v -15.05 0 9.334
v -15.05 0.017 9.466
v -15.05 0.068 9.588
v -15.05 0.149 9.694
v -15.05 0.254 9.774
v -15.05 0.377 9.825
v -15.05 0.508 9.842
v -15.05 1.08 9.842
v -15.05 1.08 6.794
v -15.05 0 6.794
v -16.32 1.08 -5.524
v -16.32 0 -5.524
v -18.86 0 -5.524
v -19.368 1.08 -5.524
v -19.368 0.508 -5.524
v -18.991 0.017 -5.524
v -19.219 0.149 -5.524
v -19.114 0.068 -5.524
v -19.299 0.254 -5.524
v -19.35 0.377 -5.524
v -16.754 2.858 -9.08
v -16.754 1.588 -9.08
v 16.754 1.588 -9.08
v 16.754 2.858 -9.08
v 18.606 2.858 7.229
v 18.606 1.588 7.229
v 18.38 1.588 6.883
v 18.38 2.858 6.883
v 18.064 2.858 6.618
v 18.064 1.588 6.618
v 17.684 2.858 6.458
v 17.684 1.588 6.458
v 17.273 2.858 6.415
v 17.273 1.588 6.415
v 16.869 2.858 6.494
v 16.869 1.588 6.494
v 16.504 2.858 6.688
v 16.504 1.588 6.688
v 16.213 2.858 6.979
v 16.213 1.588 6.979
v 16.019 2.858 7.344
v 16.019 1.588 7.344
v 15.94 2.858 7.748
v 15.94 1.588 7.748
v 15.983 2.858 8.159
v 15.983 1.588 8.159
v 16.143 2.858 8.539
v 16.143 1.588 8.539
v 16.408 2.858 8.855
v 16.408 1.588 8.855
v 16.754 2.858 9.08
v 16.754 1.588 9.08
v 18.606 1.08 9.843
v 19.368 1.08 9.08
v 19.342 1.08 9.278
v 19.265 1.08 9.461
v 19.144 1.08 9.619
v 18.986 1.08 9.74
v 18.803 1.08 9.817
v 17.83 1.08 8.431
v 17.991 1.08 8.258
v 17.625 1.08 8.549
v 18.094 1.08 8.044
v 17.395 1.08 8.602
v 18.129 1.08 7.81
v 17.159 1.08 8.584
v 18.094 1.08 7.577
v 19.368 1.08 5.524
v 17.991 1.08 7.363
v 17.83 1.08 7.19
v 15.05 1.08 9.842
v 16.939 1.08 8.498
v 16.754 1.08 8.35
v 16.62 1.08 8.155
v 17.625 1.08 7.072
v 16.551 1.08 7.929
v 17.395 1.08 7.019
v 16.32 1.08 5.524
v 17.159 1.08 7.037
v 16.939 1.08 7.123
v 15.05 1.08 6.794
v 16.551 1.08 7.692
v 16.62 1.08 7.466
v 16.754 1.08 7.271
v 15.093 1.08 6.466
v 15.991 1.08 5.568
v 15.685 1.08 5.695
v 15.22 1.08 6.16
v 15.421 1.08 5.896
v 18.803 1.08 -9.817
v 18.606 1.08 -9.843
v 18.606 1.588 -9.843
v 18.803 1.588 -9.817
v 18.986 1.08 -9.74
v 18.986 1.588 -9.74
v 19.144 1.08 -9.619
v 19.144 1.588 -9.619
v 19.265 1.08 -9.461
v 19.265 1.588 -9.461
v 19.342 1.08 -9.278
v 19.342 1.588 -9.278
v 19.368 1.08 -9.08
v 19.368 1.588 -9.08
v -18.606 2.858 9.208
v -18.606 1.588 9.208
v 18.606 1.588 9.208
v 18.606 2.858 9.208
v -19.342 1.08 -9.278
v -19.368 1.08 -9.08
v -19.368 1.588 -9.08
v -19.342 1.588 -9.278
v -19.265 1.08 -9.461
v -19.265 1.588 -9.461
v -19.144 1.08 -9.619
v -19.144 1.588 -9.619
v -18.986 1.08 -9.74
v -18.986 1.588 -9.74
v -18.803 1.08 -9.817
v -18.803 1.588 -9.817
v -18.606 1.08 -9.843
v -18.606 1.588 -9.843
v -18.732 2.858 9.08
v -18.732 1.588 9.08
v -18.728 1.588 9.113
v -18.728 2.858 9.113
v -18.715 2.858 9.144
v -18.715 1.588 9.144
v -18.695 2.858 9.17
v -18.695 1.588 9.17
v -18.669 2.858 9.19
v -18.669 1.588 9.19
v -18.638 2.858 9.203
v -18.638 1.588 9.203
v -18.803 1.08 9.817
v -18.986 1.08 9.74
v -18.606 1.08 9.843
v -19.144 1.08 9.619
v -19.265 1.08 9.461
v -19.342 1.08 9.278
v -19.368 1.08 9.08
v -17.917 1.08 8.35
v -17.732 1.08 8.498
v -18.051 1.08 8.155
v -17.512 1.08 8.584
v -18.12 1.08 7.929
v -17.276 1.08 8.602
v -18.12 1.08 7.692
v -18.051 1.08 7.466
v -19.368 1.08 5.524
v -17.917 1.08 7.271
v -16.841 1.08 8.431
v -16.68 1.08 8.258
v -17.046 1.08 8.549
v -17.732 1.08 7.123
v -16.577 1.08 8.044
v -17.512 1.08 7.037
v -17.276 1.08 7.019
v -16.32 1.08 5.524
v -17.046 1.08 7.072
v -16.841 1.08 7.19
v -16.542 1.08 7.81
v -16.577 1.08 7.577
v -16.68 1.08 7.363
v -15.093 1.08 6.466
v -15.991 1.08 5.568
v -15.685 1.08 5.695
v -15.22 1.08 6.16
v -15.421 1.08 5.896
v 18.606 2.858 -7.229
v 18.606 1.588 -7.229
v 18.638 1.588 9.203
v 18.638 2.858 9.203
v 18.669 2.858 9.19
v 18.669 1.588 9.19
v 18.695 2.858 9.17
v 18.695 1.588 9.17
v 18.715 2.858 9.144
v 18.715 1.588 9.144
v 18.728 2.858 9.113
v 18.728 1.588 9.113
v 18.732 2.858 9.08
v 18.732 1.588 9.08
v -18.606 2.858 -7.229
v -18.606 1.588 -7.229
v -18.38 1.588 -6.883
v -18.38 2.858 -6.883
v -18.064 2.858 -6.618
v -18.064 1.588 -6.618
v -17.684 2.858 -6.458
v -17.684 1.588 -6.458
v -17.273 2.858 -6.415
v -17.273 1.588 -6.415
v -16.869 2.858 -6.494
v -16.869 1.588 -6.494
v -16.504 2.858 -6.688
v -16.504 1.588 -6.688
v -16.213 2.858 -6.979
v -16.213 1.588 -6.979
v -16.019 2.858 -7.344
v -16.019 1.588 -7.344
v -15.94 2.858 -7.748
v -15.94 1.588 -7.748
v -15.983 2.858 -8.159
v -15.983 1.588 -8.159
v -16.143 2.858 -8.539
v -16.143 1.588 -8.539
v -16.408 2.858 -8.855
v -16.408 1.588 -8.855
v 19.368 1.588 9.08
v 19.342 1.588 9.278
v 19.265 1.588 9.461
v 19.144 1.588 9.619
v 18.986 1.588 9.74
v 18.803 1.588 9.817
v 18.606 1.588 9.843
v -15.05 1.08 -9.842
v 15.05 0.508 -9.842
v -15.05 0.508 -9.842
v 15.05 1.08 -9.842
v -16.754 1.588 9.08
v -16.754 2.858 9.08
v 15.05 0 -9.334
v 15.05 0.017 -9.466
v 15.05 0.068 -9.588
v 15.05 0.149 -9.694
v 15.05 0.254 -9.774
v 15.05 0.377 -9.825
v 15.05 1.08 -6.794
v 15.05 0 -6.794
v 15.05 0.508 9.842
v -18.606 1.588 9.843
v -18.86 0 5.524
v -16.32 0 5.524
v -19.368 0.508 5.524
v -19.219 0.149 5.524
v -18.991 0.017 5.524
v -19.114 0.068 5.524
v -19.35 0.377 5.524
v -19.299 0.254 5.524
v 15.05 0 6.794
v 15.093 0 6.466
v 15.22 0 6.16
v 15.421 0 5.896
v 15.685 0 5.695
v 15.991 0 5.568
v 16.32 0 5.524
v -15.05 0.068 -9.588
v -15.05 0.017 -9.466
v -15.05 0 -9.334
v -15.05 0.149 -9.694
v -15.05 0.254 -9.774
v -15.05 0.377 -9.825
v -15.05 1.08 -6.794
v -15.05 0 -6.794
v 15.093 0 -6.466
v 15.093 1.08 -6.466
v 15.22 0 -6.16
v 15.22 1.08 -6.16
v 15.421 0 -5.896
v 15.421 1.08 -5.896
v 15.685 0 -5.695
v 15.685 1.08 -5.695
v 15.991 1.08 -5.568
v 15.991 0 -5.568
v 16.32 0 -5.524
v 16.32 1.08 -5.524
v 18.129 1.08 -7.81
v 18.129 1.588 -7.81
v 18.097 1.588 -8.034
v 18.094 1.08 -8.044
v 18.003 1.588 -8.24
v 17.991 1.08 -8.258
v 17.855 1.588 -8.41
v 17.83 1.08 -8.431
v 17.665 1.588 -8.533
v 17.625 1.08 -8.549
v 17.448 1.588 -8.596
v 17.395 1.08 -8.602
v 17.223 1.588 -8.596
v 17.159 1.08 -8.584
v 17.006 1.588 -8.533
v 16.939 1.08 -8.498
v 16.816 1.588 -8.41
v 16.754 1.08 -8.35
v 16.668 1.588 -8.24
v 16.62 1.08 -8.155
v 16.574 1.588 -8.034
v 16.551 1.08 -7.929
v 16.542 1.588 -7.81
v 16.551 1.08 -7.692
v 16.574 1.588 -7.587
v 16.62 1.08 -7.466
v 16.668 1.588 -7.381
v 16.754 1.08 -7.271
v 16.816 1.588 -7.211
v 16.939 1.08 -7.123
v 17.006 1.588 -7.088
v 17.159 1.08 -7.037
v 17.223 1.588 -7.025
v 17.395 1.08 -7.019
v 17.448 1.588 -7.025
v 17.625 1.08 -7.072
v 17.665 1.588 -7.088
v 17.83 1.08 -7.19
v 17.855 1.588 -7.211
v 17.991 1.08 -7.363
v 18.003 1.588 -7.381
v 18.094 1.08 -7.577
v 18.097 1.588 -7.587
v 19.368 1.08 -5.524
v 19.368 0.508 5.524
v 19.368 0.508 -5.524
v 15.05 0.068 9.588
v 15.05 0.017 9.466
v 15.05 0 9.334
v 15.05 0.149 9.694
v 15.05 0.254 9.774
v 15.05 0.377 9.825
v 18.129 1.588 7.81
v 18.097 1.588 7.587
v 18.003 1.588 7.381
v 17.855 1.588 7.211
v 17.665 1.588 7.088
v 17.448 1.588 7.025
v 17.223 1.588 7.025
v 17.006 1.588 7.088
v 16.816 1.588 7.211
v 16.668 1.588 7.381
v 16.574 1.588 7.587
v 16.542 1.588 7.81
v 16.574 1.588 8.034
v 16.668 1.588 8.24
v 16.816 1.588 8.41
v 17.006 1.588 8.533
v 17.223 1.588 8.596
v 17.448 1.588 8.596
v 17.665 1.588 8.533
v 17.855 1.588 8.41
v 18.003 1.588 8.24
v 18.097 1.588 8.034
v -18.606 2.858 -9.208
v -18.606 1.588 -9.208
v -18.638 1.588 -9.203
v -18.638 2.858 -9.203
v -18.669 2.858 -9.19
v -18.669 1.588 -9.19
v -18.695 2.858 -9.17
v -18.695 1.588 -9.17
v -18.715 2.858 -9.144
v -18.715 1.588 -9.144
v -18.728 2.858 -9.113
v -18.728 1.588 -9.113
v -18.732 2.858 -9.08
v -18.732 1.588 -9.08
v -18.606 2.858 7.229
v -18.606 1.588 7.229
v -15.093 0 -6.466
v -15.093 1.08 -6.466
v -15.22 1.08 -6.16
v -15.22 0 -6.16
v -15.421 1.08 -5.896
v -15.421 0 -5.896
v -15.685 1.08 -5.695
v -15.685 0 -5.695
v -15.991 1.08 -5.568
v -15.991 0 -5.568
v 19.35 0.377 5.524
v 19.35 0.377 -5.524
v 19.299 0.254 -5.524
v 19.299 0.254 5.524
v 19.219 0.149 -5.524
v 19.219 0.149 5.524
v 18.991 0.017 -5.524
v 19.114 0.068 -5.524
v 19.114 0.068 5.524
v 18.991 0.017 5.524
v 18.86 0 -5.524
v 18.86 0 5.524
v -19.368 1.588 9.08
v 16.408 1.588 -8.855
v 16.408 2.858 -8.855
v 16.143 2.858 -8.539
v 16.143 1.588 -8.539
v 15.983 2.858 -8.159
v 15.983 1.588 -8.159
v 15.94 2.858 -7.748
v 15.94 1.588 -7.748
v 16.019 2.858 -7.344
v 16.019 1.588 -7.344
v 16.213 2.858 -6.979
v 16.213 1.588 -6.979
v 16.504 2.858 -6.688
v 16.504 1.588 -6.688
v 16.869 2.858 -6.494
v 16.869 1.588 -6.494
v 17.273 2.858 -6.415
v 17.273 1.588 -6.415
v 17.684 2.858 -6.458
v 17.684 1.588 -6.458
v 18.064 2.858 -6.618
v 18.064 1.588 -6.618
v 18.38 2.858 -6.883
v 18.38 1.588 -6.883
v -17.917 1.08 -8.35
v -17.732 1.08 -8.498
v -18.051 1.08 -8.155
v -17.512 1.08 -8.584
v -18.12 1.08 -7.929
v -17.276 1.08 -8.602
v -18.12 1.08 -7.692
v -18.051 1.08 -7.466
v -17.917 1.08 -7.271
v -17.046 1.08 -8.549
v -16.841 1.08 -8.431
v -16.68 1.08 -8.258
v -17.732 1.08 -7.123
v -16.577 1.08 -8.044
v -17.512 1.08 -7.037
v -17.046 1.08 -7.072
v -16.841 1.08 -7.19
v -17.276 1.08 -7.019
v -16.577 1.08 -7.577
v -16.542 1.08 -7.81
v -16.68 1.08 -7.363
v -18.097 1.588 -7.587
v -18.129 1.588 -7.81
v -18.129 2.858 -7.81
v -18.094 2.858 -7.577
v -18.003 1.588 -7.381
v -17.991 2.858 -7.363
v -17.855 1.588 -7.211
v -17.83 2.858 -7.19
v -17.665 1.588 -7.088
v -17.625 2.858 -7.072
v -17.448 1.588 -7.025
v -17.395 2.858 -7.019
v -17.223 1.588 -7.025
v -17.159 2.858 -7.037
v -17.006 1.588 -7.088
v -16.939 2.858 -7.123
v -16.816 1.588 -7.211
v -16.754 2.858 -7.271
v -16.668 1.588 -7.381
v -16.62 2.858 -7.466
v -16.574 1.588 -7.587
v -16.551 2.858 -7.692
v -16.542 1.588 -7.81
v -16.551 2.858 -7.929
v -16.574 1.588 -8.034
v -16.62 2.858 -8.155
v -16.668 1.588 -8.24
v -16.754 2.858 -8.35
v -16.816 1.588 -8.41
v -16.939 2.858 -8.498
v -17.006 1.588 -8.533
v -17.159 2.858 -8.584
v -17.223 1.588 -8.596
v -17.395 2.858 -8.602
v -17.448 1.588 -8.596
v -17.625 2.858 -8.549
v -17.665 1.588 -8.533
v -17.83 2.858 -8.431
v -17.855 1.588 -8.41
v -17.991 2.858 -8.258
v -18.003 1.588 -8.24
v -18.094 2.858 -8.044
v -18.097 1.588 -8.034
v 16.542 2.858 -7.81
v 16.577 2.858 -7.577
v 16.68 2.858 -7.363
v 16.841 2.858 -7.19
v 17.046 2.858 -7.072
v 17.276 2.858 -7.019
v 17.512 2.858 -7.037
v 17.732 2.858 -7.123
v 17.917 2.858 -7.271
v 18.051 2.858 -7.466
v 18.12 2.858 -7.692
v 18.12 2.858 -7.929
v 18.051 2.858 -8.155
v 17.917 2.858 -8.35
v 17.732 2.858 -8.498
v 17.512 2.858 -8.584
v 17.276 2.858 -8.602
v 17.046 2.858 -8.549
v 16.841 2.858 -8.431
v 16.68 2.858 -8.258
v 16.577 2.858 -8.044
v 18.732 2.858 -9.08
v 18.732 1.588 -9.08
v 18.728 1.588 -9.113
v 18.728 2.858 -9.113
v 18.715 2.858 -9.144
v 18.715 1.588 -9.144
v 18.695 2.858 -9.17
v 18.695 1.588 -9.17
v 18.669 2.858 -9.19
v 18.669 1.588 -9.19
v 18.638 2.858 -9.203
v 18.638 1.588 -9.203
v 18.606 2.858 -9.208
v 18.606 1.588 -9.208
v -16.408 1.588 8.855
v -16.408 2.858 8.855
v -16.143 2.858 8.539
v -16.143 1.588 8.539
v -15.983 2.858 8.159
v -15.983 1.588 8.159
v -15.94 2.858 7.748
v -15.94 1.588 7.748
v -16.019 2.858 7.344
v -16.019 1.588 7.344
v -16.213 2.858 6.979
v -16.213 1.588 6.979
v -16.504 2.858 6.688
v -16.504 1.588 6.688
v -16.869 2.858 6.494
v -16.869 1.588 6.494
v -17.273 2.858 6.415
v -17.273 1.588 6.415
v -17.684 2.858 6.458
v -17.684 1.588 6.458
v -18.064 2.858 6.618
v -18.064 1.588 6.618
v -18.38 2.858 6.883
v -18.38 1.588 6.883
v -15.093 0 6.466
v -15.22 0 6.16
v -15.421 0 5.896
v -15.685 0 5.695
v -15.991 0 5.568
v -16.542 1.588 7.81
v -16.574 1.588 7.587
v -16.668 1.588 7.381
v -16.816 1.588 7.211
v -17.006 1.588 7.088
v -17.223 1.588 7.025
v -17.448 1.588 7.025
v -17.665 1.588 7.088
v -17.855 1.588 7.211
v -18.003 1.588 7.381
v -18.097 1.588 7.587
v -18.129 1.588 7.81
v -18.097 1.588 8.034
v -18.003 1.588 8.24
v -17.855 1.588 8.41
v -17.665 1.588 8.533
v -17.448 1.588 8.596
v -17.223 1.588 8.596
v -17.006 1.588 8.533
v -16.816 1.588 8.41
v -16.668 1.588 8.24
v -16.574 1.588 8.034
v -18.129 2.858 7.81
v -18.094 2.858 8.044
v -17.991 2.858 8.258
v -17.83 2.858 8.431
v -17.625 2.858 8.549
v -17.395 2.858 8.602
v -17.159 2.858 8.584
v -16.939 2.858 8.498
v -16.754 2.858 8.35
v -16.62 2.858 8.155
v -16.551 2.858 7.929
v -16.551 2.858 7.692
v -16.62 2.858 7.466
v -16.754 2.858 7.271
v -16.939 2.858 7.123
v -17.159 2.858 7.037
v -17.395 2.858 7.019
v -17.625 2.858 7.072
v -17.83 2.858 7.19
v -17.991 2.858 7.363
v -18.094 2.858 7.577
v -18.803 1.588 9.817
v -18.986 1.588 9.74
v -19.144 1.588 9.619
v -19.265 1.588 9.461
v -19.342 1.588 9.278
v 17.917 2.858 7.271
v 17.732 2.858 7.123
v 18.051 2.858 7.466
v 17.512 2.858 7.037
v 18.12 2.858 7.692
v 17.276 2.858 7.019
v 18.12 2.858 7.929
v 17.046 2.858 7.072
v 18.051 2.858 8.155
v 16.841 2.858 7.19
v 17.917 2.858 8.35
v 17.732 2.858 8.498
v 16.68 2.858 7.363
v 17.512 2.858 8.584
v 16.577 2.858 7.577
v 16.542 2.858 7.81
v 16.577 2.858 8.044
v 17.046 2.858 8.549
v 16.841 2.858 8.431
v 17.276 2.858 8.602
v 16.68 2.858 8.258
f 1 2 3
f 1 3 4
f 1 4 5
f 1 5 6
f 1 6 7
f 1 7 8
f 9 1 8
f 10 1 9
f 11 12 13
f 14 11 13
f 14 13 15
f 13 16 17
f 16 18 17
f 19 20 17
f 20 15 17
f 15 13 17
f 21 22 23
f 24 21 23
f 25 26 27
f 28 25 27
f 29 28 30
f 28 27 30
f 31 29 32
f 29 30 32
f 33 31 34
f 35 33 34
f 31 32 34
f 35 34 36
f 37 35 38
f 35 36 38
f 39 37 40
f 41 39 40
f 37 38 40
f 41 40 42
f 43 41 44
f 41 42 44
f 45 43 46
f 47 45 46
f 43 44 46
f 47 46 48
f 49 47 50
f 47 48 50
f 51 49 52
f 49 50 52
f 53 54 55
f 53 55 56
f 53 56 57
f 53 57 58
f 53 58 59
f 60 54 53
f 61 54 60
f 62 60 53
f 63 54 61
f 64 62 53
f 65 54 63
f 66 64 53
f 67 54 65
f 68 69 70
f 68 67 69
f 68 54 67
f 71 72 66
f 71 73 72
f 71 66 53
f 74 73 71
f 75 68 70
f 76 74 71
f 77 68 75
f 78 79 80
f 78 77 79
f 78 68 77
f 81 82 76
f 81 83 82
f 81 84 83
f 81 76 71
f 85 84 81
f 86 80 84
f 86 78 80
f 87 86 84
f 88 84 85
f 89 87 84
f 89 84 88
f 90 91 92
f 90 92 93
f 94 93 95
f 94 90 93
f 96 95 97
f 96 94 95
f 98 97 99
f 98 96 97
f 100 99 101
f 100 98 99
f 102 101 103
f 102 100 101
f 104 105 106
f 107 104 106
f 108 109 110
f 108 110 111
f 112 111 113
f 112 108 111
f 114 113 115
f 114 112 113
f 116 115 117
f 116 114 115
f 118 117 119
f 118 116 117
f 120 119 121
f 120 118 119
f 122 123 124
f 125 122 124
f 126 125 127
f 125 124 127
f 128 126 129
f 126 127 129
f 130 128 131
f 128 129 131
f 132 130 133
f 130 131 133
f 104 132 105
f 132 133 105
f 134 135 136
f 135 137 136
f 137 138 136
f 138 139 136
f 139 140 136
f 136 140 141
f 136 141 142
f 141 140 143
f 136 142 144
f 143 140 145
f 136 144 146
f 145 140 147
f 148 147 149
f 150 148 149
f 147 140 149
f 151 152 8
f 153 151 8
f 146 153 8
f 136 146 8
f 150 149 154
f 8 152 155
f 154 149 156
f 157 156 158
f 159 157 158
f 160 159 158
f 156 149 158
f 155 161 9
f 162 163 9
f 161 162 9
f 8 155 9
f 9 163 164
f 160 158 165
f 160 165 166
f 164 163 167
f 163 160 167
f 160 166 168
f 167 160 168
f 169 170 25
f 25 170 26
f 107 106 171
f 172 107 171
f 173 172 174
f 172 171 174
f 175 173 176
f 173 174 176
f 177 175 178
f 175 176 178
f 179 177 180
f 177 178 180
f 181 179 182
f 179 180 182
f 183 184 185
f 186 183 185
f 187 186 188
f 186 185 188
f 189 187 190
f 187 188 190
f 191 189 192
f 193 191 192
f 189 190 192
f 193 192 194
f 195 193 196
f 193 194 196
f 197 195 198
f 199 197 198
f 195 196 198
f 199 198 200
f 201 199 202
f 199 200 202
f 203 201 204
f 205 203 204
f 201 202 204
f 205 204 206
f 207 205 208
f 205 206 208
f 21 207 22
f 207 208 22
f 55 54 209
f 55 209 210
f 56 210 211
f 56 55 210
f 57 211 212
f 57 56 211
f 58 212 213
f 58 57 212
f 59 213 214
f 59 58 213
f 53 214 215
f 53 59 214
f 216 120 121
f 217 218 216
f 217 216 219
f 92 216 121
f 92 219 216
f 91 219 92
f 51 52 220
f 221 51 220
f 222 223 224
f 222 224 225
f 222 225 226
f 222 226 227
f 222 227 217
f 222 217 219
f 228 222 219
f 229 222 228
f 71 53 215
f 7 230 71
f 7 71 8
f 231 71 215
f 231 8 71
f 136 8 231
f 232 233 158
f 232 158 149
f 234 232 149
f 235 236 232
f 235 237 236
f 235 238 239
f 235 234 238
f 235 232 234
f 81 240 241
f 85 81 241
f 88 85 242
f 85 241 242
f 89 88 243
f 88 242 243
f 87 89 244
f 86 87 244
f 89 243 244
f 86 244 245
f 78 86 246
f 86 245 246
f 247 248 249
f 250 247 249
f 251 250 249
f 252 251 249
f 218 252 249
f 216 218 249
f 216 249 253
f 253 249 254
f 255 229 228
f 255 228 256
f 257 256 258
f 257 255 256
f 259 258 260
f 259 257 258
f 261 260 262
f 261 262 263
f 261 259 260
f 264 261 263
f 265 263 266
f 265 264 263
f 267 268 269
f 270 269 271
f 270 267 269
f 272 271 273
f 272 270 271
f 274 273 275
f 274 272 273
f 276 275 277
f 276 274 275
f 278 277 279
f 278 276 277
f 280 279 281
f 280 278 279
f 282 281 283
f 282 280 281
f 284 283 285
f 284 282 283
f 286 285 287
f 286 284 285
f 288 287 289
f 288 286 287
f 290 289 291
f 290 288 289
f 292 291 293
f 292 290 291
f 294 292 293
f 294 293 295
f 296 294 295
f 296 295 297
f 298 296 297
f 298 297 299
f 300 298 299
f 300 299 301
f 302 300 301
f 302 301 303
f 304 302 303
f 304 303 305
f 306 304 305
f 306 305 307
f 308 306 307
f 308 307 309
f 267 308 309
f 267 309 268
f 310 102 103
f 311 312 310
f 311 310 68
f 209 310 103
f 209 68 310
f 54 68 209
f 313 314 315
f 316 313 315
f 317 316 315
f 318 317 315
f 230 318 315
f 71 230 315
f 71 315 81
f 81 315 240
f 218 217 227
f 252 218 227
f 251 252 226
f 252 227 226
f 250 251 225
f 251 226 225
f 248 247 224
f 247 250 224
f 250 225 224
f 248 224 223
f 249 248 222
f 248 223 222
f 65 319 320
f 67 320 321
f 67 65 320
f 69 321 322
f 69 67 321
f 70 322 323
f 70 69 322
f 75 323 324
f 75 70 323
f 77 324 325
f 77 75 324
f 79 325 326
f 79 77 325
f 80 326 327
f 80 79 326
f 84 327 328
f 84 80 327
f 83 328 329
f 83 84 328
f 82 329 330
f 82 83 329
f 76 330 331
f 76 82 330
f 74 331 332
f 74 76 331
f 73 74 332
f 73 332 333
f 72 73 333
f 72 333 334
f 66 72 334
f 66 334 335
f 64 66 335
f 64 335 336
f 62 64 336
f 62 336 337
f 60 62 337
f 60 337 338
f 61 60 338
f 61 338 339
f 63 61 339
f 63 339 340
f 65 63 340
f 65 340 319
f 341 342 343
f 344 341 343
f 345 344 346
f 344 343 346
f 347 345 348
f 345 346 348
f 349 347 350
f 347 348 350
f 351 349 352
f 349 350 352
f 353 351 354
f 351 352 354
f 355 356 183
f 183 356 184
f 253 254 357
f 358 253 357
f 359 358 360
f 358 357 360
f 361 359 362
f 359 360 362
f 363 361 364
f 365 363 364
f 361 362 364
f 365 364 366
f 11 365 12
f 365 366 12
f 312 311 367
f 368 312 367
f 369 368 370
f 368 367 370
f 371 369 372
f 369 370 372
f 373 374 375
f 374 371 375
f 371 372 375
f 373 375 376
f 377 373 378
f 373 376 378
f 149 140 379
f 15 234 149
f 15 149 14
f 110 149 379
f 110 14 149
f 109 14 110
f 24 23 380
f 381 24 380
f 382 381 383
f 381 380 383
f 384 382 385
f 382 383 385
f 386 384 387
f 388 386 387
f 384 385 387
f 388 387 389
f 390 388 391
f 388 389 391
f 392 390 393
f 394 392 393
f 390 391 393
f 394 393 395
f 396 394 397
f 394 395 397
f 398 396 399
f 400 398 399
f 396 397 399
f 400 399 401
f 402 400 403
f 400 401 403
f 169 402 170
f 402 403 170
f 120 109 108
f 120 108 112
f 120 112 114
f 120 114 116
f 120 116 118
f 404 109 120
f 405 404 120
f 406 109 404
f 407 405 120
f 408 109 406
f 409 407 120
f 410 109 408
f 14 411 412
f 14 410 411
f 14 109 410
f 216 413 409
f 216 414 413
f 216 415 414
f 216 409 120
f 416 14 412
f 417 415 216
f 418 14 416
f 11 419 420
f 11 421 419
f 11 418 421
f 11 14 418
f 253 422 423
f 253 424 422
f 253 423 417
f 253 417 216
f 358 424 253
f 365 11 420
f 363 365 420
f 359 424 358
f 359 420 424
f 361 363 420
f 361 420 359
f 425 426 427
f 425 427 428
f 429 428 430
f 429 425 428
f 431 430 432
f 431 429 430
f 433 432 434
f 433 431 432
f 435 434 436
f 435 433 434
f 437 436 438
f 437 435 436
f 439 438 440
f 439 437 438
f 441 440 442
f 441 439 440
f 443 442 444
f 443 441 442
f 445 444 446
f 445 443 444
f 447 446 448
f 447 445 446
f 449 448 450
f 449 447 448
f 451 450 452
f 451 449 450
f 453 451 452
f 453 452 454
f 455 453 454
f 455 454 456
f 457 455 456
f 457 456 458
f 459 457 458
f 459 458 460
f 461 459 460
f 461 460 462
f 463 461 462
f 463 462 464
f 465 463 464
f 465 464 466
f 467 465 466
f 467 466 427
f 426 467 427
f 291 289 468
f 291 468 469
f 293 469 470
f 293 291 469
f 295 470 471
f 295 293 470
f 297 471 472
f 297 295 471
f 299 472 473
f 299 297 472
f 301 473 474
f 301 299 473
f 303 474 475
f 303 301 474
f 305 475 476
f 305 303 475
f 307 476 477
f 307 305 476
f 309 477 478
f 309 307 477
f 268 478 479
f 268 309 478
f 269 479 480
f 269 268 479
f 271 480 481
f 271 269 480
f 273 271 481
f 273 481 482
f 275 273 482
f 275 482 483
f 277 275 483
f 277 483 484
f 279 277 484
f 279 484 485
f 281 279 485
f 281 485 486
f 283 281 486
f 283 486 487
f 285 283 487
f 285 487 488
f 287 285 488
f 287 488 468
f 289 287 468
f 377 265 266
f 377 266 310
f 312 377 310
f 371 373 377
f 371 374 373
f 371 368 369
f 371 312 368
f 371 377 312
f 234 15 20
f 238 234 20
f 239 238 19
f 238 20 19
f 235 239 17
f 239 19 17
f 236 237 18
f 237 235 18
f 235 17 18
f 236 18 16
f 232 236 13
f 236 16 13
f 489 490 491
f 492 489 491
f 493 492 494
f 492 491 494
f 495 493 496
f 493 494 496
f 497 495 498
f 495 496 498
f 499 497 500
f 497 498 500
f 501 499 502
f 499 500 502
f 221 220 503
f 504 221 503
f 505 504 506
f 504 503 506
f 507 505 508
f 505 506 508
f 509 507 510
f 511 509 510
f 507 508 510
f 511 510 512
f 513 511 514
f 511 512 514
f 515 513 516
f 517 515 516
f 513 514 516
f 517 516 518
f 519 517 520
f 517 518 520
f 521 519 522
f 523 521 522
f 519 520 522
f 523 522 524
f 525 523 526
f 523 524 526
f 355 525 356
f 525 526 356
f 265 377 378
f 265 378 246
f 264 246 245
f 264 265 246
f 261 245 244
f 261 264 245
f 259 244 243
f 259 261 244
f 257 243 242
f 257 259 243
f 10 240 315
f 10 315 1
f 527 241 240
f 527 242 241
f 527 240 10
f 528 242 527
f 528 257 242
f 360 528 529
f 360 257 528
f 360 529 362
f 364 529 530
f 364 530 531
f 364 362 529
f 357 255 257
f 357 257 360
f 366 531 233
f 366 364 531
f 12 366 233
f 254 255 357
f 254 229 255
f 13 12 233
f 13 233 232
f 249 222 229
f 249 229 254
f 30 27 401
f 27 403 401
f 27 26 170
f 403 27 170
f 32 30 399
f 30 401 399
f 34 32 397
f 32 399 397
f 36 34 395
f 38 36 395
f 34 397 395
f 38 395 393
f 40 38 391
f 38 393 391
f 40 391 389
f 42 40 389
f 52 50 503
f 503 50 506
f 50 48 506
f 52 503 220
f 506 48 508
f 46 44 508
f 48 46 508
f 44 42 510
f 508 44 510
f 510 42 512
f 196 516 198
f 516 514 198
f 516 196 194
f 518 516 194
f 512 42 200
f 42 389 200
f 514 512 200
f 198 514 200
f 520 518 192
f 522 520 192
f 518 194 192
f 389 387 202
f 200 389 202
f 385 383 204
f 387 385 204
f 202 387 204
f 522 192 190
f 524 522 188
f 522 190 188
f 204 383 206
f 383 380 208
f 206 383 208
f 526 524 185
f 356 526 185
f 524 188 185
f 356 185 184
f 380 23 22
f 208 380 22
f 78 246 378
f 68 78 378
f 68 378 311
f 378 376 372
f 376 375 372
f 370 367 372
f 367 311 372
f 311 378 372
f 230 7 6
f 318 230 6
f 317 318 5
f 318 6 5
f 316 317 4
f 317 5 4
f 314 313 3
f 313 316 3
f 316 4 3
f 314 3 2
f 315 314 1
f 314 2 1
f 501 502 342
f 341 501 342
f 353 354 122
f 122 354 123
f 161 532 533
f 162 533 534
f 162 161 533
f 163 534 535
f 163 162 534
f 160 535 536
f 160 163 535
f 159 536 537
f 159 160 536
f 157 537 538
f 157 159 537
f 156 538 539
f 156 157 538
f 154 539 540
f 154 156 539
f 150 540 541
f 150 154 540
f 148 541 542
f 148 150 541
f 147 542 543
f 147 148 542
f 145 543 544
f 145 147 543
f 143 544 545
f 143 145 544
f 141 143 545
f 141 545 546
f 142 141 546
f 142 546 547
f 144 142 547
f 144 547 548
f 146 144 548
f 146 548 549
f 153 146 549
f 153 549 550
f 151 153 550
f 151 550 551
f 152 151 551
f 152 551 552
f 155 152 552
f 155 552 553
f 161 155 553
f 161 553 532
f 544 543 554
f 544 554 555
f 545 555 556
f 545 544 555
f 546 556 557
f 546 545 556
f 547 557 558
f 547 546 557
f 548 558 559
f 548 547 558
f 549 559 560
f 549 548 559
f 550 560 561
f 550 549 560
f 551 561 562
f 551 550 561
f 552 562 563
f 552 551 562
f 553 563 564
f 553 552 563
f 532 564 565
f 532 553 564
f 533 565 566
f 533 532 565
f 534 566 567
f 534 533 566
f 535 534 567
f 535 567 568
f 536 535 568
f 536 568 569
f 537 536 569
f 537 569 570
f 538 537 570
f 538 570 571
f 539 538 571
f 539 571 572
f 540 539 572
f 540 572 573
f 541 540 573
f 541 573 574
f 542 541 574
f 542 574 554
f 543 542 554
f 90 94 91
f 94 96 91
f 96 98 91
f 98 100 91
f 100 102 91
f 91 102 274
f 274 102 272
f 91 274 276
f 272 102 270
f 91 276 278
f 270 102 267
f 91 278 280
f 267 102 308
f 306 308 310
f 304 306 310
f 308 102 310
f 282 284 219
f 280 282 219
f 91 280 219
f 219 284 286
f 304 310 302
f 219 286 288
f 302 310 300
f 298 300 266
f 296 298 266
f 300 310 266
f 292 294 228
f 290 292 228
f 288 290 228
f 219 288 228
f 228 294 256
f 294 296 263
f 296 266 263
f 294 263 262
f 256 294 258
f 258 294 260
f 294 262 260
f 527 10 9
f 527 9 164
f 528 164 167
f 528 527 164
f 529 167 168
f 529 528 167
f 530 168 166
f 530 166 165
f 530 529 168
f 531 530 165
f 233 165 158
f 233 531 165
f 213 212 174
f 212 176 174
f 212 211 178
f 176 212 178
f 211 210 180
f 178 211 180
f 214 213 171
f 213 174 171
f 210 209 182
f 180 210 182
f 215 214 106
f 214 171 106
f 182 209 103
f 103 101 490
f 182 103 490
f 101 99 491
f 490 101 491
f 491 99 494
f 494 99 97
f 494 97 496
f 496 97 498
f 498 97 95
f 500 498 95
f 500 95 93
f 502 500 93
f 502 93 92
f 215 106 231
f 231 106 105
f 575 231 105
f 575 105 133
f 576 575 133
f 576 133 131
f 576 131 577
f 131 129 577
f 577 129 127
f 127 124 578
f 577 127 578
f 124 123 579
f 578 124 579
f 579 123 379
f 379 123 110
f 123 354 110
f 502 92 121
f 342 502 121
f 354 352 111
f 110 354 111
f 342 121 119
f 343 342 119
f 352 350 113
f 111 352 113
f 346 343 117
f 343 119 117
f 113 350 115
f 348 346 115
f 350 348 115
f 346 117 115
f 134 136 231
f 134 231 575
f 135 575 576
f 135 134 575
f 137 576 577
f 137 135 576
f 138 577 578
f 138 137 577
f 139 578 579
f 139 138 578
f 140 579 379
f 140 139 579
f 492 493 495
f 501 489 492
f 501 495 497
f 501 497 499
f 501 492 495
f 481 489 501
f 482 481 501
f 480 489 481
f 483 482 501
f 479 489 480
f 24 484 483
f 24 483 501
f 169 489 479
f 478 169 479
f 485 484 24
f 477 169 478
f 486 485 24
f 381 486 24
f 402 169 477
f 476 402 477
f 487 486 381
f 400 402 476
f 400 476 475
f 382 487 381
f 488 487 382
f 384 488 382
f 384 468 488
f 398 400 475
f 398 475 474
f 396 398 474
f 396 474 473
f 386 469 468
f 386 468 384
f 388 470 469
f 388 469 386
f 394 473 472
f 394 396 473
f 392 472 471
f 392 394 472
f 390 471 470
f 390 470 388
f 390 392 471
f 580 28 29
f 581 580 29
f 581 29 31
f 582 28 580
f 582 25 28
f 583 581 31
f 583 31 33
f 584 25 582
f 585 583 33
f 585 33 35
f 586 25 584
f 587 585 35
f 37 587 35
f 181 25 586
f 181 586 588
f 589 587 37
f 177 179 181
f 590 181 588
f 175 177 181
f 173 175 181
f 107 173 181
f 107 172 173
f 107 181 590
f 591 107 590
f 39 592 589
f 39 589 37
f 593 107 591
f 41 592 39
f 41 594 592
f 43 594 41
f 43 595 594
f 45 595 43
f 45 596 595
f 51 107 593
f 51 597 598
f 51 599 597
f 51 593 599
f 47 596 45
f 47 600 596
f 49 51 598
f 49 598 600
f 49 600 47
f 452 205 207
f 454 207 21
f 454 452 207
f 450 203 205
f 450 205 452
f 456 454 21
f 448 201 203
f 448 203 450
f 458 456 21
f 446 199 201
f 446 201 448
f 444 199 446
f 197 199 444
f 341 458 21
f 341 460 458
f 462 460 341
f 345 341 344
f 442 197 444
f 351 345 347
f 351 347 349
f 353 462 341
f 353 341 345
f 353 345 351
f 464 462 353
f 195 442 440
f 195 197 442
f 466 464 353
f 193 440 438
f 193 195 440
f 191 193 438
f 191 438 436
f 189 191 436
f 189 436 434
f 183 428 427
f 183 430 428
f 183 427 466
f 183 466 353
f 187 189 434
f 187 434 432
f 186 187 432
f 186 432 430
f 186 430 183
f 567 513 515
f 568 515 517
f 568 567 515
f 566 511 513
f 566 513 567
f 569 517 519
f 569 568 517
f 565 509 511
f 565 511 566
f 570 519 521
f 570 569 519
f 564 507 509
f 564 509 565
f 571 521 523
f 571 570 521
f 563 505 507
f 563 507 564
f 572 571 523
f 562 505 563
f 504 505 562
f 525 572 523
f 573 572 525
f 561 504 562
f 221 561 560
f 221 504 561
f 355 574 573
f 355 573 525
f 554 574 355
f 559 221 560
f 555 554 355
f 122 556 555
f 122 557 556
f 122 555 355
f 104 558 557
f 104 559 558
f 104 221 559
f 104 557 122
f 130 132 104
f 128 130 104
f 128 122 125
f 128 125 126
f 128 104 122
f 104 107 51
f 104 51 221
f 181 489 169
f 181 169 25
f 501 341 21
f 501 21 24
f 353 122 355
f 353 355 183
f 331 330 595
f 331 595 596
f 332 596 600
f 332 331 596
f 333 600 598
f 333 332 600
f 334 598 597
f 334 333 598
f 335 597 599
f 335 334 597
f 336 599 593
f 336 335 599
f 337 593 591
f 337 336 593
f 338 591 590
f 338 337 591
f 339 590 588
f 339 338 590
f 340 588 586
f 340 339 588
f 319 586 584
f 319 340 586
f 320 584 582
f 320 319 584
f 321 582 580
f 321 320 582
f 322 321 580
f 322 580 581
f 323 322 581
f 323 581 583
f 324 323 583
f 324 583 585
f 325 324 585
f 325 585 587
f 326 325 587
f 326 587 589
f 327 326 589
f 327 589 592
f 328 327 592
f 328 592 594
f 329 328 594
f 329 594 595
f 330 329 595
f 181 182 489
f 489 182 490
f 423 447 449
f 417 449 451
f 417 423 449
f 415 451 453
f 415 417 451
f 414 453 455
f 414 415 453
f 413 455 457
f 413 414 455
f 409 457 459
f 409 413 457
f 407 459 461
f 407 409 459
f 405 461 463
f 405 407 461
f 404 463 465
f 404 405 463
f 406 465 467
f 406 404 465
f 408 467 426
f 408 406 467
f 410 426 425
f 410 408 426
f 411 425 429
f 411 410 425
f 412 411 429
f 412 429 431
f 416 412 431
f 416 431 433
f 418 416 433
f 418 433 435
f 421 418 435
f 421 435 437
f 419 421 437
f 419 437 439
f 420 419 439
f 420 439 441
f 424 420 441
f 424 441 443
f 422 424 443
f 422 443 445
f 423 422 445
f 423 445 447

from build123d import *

# Parameters (mm, degrees)
SKETCH1_R            = 0.79375
EXTRUDE1_DEPTH       = 1.5875
FILLET2_R            = 0.508
SKETCH2_R            = 0.79375
EXTRUDE2_DEPTH       = 1.27
CUT_EXTRUDE1_DEPTH   = 1.0795
MIRROR2_COPY_1_DEPTH = 1.0795


with BuildPart() as part:
    # Sketch1 → Extrude1 (new body)
    with BuildSketch(Plane(origin=(0, 0, 0), x_dir=(1, 0, 0), z_dir=(0, 1, 0))):
        with BuildLine():
            Line((-18.6055, 9.8425), (18.6055, 9.8425))
            ThreePointArc((18.6055, 9.8425), (19.144315367, 9.619315367), (19.3675, 9.0805))
            Line((19.3675, 9.0805), (19.3675, -9.0805))
            ThreePointArc((19.3675, -9.0805), (19.144315367, -9.619315367), (18.6055, -9.8425))
            Line((18.6055, -9.8425), (-18.6055, -9.8425))
            ThreePointArc((-18.6055, -9.8425), (-19.144315367, -9.619315367), (-19.3675, -9.0805))
            Line((-19.3675, -9.0805), (-19.3675, 9.0805))
            ThreePointArc((-19.3675, 9.0805), (-19.144315367, 9.619315367), (-18.6055, 9.8425))
        make_face()
        with Locations((-17.3355, 7.8105)):
            Circle(SKETCH1_R, mode=Mode.SUBTRACT)
        with Locations((17.3355, 7.8105)):
            Circle(SKETCH1_R, mode=Mode.SUBTRACT)
        with Locations((17.3355, -7.8105)):
            Circle(SKETCH1_R, mode=Mode.SUBTRACT)
        with Locations((-17.3355, -7.8105)):
            Circle(SKETCH1_R, mode=Mode.SUBTRACT)
    extrude(amount=EXTRUDE1_DEPTH)

    # Fillet2
    fillet2_edges = [part.edges().sort_by_distance(p)[0] for p in [
        (-19.3675, 0, 0),
        (-19.144315367, 0, -9.619315367),
        (0, 0, -9.8425),
        (19.144315367, 0, -9.619315367),
        (19.3675, 0, 0),
        (19.144315367, 0, 9.619315367),
        (0, 0, 9.8425),
        (-19.144315367, 0, 9.619315367),
    ]]
    fillet(fillet2_edges, radius=FILLET2_R)

    # Sketch2 → Extrude2 (add)
    with BuildSketch(Plane(origin=(0, 1.5875, 0), x_dir=(-1, 0, 0), z_dir=(0, 1, 0))):
        with BuildLine():
            Line((18.6055, 9.2075), (-18.6055, 9.2075))
            ThreePointArc((-18.6055, 9.2075), (-18.695302561, 9.170302561), (-18.7325, 9.0805))
            Line((-18.7325, 9.0805), (-18.7325, -9.0805))
            ThreePointArc((-18.7325, -9.0805), (-18.695302561, -9.170302561), (-18.6055, -9.2075))
            Line((-18.6055, -9.2075), (18.6055, -9.2075))
            ThreePointArc((18.6055, -9.2075), (18.695302561, -9.170302561), (18.7325, -9.0805))
            Line((18.7325, -9.0805), (18.7325, 9.0805))
            ThreePointArc((18.7325, 9.0805), (18.695302561, 9.170302561), (18.6055, 9.2075))
        make_face()
        with Locations((-17.3355, 7.8105)):
            Circle(SKETCH2_R, mode=Mode.SUBTRACT)
        with Locations((-17.3355, -7.8105)):
            Circle(SKETCH2_R, mode=Mode.SUBTRACT)
        with Locations((17.3355, -7.8105)):
            Circle(SKETCH2_R, mode=Mode.SUBTRACT)
        with Locations((17.3355, 7.8105)):
            Circle(SKETCH2_R, mode=Mode.SUBTRACT)
        with BuildLine():
            Line((-18.6055, -7.228512887), (-18.6055, 7.228512887))
            ThreePointArc((-18.6055, 7.228512887), (-16.347671827, 6.822671827), (-16.753512887, 9.0805))
            Line((-16.753512887, 9.0805), (16.753512887, 9.0805))
            ThreePointArc((16.753512887, 9.0805), (16.347671827, 6.822671827), (18.6055, 7.228512887))
            Line((18.6055, 7.228512887), (18.6055, -7.228512887))
            ThreePointArc((18.6055, -7.228512887), (16.347671827, -6.822671827), (16.753512887, -9.0805))
            Line((16.753512887, -9.0805), (-16.753512887, -9.0805))
            ThreePointArc((-16.753512887, -9.0805), (-16.347671827, -6.822671827), (-18.6055, -7.228512887))
        make_face(mode=Mode.SUBTRACT)
    extrude(amount=EXTRUDE2_DEPTH)

    # Sketch3 → Cut-Extrude1 (cut)
    with BuildSketch(Plane.XZ):
        with BuildLine():
            Line((-16.3195, -5.5245), (-19.3675, -5.5245))
            Line((-19.3675, -5.5245), (-19.3675, -9.8425))
            Line((-19.3675, -9.8425), (-15.0495, -9.8425))
            Line((-15.0495, -9.8425), (-15.0495, -6.7945))
            ThreePointArc((-15.0495, -6.7945), (-15.421474388, -5.896474388), (-16.3195, -5.5245))
        make_face()
    cut_extrude1 = extrude(amount=-CUT_EXTRUDE1_DEPTH, mode=Mode.SUBTRACT)

    # Mirror1: Cut-Extrude1 across plane
    add(cut_extrude1.mirror(Plane(origin=(0, 0, 0), x_dir=(0, 0, 1), z_dir=(1, 0, 0))), mode=Mode.SUBTRACT)

    # Mirror2: Cut-Extrude1 across plane
    add(cut_extrude1.mirror(Plane.XY), mode=Mode.SUBTRACT)

    # Mirror2 copy 1 sketch → Mirror2 copy 1 (cut)
    with BuildSketch(Plane(origin=(0, 0, 0), x_dir=(-1, 0, 0), z_dir=(0, -1, 0))):
        with BuildLine():
            Line((-16.3195, -5.5245), (-19.3675, -5.5245))
            Line((-19.3675, -5.5245), (-19.3675, -9.8425))
            Line((-19.3675, -9.8425), (-15.0495, -9.8425))
            Line((-15.0495, -9.8425), (-15.0495, -6.7945))
            ThreePointArc((-15.0495, -6.7945), (-15.421474388, -5.896474388), (-16.3195, -5.5245))
        make_face()
    extrude(amount=-MIRROR2_COPY_1_DEPTH, mode=Mode.SUBTRACT)


solid = part.part
